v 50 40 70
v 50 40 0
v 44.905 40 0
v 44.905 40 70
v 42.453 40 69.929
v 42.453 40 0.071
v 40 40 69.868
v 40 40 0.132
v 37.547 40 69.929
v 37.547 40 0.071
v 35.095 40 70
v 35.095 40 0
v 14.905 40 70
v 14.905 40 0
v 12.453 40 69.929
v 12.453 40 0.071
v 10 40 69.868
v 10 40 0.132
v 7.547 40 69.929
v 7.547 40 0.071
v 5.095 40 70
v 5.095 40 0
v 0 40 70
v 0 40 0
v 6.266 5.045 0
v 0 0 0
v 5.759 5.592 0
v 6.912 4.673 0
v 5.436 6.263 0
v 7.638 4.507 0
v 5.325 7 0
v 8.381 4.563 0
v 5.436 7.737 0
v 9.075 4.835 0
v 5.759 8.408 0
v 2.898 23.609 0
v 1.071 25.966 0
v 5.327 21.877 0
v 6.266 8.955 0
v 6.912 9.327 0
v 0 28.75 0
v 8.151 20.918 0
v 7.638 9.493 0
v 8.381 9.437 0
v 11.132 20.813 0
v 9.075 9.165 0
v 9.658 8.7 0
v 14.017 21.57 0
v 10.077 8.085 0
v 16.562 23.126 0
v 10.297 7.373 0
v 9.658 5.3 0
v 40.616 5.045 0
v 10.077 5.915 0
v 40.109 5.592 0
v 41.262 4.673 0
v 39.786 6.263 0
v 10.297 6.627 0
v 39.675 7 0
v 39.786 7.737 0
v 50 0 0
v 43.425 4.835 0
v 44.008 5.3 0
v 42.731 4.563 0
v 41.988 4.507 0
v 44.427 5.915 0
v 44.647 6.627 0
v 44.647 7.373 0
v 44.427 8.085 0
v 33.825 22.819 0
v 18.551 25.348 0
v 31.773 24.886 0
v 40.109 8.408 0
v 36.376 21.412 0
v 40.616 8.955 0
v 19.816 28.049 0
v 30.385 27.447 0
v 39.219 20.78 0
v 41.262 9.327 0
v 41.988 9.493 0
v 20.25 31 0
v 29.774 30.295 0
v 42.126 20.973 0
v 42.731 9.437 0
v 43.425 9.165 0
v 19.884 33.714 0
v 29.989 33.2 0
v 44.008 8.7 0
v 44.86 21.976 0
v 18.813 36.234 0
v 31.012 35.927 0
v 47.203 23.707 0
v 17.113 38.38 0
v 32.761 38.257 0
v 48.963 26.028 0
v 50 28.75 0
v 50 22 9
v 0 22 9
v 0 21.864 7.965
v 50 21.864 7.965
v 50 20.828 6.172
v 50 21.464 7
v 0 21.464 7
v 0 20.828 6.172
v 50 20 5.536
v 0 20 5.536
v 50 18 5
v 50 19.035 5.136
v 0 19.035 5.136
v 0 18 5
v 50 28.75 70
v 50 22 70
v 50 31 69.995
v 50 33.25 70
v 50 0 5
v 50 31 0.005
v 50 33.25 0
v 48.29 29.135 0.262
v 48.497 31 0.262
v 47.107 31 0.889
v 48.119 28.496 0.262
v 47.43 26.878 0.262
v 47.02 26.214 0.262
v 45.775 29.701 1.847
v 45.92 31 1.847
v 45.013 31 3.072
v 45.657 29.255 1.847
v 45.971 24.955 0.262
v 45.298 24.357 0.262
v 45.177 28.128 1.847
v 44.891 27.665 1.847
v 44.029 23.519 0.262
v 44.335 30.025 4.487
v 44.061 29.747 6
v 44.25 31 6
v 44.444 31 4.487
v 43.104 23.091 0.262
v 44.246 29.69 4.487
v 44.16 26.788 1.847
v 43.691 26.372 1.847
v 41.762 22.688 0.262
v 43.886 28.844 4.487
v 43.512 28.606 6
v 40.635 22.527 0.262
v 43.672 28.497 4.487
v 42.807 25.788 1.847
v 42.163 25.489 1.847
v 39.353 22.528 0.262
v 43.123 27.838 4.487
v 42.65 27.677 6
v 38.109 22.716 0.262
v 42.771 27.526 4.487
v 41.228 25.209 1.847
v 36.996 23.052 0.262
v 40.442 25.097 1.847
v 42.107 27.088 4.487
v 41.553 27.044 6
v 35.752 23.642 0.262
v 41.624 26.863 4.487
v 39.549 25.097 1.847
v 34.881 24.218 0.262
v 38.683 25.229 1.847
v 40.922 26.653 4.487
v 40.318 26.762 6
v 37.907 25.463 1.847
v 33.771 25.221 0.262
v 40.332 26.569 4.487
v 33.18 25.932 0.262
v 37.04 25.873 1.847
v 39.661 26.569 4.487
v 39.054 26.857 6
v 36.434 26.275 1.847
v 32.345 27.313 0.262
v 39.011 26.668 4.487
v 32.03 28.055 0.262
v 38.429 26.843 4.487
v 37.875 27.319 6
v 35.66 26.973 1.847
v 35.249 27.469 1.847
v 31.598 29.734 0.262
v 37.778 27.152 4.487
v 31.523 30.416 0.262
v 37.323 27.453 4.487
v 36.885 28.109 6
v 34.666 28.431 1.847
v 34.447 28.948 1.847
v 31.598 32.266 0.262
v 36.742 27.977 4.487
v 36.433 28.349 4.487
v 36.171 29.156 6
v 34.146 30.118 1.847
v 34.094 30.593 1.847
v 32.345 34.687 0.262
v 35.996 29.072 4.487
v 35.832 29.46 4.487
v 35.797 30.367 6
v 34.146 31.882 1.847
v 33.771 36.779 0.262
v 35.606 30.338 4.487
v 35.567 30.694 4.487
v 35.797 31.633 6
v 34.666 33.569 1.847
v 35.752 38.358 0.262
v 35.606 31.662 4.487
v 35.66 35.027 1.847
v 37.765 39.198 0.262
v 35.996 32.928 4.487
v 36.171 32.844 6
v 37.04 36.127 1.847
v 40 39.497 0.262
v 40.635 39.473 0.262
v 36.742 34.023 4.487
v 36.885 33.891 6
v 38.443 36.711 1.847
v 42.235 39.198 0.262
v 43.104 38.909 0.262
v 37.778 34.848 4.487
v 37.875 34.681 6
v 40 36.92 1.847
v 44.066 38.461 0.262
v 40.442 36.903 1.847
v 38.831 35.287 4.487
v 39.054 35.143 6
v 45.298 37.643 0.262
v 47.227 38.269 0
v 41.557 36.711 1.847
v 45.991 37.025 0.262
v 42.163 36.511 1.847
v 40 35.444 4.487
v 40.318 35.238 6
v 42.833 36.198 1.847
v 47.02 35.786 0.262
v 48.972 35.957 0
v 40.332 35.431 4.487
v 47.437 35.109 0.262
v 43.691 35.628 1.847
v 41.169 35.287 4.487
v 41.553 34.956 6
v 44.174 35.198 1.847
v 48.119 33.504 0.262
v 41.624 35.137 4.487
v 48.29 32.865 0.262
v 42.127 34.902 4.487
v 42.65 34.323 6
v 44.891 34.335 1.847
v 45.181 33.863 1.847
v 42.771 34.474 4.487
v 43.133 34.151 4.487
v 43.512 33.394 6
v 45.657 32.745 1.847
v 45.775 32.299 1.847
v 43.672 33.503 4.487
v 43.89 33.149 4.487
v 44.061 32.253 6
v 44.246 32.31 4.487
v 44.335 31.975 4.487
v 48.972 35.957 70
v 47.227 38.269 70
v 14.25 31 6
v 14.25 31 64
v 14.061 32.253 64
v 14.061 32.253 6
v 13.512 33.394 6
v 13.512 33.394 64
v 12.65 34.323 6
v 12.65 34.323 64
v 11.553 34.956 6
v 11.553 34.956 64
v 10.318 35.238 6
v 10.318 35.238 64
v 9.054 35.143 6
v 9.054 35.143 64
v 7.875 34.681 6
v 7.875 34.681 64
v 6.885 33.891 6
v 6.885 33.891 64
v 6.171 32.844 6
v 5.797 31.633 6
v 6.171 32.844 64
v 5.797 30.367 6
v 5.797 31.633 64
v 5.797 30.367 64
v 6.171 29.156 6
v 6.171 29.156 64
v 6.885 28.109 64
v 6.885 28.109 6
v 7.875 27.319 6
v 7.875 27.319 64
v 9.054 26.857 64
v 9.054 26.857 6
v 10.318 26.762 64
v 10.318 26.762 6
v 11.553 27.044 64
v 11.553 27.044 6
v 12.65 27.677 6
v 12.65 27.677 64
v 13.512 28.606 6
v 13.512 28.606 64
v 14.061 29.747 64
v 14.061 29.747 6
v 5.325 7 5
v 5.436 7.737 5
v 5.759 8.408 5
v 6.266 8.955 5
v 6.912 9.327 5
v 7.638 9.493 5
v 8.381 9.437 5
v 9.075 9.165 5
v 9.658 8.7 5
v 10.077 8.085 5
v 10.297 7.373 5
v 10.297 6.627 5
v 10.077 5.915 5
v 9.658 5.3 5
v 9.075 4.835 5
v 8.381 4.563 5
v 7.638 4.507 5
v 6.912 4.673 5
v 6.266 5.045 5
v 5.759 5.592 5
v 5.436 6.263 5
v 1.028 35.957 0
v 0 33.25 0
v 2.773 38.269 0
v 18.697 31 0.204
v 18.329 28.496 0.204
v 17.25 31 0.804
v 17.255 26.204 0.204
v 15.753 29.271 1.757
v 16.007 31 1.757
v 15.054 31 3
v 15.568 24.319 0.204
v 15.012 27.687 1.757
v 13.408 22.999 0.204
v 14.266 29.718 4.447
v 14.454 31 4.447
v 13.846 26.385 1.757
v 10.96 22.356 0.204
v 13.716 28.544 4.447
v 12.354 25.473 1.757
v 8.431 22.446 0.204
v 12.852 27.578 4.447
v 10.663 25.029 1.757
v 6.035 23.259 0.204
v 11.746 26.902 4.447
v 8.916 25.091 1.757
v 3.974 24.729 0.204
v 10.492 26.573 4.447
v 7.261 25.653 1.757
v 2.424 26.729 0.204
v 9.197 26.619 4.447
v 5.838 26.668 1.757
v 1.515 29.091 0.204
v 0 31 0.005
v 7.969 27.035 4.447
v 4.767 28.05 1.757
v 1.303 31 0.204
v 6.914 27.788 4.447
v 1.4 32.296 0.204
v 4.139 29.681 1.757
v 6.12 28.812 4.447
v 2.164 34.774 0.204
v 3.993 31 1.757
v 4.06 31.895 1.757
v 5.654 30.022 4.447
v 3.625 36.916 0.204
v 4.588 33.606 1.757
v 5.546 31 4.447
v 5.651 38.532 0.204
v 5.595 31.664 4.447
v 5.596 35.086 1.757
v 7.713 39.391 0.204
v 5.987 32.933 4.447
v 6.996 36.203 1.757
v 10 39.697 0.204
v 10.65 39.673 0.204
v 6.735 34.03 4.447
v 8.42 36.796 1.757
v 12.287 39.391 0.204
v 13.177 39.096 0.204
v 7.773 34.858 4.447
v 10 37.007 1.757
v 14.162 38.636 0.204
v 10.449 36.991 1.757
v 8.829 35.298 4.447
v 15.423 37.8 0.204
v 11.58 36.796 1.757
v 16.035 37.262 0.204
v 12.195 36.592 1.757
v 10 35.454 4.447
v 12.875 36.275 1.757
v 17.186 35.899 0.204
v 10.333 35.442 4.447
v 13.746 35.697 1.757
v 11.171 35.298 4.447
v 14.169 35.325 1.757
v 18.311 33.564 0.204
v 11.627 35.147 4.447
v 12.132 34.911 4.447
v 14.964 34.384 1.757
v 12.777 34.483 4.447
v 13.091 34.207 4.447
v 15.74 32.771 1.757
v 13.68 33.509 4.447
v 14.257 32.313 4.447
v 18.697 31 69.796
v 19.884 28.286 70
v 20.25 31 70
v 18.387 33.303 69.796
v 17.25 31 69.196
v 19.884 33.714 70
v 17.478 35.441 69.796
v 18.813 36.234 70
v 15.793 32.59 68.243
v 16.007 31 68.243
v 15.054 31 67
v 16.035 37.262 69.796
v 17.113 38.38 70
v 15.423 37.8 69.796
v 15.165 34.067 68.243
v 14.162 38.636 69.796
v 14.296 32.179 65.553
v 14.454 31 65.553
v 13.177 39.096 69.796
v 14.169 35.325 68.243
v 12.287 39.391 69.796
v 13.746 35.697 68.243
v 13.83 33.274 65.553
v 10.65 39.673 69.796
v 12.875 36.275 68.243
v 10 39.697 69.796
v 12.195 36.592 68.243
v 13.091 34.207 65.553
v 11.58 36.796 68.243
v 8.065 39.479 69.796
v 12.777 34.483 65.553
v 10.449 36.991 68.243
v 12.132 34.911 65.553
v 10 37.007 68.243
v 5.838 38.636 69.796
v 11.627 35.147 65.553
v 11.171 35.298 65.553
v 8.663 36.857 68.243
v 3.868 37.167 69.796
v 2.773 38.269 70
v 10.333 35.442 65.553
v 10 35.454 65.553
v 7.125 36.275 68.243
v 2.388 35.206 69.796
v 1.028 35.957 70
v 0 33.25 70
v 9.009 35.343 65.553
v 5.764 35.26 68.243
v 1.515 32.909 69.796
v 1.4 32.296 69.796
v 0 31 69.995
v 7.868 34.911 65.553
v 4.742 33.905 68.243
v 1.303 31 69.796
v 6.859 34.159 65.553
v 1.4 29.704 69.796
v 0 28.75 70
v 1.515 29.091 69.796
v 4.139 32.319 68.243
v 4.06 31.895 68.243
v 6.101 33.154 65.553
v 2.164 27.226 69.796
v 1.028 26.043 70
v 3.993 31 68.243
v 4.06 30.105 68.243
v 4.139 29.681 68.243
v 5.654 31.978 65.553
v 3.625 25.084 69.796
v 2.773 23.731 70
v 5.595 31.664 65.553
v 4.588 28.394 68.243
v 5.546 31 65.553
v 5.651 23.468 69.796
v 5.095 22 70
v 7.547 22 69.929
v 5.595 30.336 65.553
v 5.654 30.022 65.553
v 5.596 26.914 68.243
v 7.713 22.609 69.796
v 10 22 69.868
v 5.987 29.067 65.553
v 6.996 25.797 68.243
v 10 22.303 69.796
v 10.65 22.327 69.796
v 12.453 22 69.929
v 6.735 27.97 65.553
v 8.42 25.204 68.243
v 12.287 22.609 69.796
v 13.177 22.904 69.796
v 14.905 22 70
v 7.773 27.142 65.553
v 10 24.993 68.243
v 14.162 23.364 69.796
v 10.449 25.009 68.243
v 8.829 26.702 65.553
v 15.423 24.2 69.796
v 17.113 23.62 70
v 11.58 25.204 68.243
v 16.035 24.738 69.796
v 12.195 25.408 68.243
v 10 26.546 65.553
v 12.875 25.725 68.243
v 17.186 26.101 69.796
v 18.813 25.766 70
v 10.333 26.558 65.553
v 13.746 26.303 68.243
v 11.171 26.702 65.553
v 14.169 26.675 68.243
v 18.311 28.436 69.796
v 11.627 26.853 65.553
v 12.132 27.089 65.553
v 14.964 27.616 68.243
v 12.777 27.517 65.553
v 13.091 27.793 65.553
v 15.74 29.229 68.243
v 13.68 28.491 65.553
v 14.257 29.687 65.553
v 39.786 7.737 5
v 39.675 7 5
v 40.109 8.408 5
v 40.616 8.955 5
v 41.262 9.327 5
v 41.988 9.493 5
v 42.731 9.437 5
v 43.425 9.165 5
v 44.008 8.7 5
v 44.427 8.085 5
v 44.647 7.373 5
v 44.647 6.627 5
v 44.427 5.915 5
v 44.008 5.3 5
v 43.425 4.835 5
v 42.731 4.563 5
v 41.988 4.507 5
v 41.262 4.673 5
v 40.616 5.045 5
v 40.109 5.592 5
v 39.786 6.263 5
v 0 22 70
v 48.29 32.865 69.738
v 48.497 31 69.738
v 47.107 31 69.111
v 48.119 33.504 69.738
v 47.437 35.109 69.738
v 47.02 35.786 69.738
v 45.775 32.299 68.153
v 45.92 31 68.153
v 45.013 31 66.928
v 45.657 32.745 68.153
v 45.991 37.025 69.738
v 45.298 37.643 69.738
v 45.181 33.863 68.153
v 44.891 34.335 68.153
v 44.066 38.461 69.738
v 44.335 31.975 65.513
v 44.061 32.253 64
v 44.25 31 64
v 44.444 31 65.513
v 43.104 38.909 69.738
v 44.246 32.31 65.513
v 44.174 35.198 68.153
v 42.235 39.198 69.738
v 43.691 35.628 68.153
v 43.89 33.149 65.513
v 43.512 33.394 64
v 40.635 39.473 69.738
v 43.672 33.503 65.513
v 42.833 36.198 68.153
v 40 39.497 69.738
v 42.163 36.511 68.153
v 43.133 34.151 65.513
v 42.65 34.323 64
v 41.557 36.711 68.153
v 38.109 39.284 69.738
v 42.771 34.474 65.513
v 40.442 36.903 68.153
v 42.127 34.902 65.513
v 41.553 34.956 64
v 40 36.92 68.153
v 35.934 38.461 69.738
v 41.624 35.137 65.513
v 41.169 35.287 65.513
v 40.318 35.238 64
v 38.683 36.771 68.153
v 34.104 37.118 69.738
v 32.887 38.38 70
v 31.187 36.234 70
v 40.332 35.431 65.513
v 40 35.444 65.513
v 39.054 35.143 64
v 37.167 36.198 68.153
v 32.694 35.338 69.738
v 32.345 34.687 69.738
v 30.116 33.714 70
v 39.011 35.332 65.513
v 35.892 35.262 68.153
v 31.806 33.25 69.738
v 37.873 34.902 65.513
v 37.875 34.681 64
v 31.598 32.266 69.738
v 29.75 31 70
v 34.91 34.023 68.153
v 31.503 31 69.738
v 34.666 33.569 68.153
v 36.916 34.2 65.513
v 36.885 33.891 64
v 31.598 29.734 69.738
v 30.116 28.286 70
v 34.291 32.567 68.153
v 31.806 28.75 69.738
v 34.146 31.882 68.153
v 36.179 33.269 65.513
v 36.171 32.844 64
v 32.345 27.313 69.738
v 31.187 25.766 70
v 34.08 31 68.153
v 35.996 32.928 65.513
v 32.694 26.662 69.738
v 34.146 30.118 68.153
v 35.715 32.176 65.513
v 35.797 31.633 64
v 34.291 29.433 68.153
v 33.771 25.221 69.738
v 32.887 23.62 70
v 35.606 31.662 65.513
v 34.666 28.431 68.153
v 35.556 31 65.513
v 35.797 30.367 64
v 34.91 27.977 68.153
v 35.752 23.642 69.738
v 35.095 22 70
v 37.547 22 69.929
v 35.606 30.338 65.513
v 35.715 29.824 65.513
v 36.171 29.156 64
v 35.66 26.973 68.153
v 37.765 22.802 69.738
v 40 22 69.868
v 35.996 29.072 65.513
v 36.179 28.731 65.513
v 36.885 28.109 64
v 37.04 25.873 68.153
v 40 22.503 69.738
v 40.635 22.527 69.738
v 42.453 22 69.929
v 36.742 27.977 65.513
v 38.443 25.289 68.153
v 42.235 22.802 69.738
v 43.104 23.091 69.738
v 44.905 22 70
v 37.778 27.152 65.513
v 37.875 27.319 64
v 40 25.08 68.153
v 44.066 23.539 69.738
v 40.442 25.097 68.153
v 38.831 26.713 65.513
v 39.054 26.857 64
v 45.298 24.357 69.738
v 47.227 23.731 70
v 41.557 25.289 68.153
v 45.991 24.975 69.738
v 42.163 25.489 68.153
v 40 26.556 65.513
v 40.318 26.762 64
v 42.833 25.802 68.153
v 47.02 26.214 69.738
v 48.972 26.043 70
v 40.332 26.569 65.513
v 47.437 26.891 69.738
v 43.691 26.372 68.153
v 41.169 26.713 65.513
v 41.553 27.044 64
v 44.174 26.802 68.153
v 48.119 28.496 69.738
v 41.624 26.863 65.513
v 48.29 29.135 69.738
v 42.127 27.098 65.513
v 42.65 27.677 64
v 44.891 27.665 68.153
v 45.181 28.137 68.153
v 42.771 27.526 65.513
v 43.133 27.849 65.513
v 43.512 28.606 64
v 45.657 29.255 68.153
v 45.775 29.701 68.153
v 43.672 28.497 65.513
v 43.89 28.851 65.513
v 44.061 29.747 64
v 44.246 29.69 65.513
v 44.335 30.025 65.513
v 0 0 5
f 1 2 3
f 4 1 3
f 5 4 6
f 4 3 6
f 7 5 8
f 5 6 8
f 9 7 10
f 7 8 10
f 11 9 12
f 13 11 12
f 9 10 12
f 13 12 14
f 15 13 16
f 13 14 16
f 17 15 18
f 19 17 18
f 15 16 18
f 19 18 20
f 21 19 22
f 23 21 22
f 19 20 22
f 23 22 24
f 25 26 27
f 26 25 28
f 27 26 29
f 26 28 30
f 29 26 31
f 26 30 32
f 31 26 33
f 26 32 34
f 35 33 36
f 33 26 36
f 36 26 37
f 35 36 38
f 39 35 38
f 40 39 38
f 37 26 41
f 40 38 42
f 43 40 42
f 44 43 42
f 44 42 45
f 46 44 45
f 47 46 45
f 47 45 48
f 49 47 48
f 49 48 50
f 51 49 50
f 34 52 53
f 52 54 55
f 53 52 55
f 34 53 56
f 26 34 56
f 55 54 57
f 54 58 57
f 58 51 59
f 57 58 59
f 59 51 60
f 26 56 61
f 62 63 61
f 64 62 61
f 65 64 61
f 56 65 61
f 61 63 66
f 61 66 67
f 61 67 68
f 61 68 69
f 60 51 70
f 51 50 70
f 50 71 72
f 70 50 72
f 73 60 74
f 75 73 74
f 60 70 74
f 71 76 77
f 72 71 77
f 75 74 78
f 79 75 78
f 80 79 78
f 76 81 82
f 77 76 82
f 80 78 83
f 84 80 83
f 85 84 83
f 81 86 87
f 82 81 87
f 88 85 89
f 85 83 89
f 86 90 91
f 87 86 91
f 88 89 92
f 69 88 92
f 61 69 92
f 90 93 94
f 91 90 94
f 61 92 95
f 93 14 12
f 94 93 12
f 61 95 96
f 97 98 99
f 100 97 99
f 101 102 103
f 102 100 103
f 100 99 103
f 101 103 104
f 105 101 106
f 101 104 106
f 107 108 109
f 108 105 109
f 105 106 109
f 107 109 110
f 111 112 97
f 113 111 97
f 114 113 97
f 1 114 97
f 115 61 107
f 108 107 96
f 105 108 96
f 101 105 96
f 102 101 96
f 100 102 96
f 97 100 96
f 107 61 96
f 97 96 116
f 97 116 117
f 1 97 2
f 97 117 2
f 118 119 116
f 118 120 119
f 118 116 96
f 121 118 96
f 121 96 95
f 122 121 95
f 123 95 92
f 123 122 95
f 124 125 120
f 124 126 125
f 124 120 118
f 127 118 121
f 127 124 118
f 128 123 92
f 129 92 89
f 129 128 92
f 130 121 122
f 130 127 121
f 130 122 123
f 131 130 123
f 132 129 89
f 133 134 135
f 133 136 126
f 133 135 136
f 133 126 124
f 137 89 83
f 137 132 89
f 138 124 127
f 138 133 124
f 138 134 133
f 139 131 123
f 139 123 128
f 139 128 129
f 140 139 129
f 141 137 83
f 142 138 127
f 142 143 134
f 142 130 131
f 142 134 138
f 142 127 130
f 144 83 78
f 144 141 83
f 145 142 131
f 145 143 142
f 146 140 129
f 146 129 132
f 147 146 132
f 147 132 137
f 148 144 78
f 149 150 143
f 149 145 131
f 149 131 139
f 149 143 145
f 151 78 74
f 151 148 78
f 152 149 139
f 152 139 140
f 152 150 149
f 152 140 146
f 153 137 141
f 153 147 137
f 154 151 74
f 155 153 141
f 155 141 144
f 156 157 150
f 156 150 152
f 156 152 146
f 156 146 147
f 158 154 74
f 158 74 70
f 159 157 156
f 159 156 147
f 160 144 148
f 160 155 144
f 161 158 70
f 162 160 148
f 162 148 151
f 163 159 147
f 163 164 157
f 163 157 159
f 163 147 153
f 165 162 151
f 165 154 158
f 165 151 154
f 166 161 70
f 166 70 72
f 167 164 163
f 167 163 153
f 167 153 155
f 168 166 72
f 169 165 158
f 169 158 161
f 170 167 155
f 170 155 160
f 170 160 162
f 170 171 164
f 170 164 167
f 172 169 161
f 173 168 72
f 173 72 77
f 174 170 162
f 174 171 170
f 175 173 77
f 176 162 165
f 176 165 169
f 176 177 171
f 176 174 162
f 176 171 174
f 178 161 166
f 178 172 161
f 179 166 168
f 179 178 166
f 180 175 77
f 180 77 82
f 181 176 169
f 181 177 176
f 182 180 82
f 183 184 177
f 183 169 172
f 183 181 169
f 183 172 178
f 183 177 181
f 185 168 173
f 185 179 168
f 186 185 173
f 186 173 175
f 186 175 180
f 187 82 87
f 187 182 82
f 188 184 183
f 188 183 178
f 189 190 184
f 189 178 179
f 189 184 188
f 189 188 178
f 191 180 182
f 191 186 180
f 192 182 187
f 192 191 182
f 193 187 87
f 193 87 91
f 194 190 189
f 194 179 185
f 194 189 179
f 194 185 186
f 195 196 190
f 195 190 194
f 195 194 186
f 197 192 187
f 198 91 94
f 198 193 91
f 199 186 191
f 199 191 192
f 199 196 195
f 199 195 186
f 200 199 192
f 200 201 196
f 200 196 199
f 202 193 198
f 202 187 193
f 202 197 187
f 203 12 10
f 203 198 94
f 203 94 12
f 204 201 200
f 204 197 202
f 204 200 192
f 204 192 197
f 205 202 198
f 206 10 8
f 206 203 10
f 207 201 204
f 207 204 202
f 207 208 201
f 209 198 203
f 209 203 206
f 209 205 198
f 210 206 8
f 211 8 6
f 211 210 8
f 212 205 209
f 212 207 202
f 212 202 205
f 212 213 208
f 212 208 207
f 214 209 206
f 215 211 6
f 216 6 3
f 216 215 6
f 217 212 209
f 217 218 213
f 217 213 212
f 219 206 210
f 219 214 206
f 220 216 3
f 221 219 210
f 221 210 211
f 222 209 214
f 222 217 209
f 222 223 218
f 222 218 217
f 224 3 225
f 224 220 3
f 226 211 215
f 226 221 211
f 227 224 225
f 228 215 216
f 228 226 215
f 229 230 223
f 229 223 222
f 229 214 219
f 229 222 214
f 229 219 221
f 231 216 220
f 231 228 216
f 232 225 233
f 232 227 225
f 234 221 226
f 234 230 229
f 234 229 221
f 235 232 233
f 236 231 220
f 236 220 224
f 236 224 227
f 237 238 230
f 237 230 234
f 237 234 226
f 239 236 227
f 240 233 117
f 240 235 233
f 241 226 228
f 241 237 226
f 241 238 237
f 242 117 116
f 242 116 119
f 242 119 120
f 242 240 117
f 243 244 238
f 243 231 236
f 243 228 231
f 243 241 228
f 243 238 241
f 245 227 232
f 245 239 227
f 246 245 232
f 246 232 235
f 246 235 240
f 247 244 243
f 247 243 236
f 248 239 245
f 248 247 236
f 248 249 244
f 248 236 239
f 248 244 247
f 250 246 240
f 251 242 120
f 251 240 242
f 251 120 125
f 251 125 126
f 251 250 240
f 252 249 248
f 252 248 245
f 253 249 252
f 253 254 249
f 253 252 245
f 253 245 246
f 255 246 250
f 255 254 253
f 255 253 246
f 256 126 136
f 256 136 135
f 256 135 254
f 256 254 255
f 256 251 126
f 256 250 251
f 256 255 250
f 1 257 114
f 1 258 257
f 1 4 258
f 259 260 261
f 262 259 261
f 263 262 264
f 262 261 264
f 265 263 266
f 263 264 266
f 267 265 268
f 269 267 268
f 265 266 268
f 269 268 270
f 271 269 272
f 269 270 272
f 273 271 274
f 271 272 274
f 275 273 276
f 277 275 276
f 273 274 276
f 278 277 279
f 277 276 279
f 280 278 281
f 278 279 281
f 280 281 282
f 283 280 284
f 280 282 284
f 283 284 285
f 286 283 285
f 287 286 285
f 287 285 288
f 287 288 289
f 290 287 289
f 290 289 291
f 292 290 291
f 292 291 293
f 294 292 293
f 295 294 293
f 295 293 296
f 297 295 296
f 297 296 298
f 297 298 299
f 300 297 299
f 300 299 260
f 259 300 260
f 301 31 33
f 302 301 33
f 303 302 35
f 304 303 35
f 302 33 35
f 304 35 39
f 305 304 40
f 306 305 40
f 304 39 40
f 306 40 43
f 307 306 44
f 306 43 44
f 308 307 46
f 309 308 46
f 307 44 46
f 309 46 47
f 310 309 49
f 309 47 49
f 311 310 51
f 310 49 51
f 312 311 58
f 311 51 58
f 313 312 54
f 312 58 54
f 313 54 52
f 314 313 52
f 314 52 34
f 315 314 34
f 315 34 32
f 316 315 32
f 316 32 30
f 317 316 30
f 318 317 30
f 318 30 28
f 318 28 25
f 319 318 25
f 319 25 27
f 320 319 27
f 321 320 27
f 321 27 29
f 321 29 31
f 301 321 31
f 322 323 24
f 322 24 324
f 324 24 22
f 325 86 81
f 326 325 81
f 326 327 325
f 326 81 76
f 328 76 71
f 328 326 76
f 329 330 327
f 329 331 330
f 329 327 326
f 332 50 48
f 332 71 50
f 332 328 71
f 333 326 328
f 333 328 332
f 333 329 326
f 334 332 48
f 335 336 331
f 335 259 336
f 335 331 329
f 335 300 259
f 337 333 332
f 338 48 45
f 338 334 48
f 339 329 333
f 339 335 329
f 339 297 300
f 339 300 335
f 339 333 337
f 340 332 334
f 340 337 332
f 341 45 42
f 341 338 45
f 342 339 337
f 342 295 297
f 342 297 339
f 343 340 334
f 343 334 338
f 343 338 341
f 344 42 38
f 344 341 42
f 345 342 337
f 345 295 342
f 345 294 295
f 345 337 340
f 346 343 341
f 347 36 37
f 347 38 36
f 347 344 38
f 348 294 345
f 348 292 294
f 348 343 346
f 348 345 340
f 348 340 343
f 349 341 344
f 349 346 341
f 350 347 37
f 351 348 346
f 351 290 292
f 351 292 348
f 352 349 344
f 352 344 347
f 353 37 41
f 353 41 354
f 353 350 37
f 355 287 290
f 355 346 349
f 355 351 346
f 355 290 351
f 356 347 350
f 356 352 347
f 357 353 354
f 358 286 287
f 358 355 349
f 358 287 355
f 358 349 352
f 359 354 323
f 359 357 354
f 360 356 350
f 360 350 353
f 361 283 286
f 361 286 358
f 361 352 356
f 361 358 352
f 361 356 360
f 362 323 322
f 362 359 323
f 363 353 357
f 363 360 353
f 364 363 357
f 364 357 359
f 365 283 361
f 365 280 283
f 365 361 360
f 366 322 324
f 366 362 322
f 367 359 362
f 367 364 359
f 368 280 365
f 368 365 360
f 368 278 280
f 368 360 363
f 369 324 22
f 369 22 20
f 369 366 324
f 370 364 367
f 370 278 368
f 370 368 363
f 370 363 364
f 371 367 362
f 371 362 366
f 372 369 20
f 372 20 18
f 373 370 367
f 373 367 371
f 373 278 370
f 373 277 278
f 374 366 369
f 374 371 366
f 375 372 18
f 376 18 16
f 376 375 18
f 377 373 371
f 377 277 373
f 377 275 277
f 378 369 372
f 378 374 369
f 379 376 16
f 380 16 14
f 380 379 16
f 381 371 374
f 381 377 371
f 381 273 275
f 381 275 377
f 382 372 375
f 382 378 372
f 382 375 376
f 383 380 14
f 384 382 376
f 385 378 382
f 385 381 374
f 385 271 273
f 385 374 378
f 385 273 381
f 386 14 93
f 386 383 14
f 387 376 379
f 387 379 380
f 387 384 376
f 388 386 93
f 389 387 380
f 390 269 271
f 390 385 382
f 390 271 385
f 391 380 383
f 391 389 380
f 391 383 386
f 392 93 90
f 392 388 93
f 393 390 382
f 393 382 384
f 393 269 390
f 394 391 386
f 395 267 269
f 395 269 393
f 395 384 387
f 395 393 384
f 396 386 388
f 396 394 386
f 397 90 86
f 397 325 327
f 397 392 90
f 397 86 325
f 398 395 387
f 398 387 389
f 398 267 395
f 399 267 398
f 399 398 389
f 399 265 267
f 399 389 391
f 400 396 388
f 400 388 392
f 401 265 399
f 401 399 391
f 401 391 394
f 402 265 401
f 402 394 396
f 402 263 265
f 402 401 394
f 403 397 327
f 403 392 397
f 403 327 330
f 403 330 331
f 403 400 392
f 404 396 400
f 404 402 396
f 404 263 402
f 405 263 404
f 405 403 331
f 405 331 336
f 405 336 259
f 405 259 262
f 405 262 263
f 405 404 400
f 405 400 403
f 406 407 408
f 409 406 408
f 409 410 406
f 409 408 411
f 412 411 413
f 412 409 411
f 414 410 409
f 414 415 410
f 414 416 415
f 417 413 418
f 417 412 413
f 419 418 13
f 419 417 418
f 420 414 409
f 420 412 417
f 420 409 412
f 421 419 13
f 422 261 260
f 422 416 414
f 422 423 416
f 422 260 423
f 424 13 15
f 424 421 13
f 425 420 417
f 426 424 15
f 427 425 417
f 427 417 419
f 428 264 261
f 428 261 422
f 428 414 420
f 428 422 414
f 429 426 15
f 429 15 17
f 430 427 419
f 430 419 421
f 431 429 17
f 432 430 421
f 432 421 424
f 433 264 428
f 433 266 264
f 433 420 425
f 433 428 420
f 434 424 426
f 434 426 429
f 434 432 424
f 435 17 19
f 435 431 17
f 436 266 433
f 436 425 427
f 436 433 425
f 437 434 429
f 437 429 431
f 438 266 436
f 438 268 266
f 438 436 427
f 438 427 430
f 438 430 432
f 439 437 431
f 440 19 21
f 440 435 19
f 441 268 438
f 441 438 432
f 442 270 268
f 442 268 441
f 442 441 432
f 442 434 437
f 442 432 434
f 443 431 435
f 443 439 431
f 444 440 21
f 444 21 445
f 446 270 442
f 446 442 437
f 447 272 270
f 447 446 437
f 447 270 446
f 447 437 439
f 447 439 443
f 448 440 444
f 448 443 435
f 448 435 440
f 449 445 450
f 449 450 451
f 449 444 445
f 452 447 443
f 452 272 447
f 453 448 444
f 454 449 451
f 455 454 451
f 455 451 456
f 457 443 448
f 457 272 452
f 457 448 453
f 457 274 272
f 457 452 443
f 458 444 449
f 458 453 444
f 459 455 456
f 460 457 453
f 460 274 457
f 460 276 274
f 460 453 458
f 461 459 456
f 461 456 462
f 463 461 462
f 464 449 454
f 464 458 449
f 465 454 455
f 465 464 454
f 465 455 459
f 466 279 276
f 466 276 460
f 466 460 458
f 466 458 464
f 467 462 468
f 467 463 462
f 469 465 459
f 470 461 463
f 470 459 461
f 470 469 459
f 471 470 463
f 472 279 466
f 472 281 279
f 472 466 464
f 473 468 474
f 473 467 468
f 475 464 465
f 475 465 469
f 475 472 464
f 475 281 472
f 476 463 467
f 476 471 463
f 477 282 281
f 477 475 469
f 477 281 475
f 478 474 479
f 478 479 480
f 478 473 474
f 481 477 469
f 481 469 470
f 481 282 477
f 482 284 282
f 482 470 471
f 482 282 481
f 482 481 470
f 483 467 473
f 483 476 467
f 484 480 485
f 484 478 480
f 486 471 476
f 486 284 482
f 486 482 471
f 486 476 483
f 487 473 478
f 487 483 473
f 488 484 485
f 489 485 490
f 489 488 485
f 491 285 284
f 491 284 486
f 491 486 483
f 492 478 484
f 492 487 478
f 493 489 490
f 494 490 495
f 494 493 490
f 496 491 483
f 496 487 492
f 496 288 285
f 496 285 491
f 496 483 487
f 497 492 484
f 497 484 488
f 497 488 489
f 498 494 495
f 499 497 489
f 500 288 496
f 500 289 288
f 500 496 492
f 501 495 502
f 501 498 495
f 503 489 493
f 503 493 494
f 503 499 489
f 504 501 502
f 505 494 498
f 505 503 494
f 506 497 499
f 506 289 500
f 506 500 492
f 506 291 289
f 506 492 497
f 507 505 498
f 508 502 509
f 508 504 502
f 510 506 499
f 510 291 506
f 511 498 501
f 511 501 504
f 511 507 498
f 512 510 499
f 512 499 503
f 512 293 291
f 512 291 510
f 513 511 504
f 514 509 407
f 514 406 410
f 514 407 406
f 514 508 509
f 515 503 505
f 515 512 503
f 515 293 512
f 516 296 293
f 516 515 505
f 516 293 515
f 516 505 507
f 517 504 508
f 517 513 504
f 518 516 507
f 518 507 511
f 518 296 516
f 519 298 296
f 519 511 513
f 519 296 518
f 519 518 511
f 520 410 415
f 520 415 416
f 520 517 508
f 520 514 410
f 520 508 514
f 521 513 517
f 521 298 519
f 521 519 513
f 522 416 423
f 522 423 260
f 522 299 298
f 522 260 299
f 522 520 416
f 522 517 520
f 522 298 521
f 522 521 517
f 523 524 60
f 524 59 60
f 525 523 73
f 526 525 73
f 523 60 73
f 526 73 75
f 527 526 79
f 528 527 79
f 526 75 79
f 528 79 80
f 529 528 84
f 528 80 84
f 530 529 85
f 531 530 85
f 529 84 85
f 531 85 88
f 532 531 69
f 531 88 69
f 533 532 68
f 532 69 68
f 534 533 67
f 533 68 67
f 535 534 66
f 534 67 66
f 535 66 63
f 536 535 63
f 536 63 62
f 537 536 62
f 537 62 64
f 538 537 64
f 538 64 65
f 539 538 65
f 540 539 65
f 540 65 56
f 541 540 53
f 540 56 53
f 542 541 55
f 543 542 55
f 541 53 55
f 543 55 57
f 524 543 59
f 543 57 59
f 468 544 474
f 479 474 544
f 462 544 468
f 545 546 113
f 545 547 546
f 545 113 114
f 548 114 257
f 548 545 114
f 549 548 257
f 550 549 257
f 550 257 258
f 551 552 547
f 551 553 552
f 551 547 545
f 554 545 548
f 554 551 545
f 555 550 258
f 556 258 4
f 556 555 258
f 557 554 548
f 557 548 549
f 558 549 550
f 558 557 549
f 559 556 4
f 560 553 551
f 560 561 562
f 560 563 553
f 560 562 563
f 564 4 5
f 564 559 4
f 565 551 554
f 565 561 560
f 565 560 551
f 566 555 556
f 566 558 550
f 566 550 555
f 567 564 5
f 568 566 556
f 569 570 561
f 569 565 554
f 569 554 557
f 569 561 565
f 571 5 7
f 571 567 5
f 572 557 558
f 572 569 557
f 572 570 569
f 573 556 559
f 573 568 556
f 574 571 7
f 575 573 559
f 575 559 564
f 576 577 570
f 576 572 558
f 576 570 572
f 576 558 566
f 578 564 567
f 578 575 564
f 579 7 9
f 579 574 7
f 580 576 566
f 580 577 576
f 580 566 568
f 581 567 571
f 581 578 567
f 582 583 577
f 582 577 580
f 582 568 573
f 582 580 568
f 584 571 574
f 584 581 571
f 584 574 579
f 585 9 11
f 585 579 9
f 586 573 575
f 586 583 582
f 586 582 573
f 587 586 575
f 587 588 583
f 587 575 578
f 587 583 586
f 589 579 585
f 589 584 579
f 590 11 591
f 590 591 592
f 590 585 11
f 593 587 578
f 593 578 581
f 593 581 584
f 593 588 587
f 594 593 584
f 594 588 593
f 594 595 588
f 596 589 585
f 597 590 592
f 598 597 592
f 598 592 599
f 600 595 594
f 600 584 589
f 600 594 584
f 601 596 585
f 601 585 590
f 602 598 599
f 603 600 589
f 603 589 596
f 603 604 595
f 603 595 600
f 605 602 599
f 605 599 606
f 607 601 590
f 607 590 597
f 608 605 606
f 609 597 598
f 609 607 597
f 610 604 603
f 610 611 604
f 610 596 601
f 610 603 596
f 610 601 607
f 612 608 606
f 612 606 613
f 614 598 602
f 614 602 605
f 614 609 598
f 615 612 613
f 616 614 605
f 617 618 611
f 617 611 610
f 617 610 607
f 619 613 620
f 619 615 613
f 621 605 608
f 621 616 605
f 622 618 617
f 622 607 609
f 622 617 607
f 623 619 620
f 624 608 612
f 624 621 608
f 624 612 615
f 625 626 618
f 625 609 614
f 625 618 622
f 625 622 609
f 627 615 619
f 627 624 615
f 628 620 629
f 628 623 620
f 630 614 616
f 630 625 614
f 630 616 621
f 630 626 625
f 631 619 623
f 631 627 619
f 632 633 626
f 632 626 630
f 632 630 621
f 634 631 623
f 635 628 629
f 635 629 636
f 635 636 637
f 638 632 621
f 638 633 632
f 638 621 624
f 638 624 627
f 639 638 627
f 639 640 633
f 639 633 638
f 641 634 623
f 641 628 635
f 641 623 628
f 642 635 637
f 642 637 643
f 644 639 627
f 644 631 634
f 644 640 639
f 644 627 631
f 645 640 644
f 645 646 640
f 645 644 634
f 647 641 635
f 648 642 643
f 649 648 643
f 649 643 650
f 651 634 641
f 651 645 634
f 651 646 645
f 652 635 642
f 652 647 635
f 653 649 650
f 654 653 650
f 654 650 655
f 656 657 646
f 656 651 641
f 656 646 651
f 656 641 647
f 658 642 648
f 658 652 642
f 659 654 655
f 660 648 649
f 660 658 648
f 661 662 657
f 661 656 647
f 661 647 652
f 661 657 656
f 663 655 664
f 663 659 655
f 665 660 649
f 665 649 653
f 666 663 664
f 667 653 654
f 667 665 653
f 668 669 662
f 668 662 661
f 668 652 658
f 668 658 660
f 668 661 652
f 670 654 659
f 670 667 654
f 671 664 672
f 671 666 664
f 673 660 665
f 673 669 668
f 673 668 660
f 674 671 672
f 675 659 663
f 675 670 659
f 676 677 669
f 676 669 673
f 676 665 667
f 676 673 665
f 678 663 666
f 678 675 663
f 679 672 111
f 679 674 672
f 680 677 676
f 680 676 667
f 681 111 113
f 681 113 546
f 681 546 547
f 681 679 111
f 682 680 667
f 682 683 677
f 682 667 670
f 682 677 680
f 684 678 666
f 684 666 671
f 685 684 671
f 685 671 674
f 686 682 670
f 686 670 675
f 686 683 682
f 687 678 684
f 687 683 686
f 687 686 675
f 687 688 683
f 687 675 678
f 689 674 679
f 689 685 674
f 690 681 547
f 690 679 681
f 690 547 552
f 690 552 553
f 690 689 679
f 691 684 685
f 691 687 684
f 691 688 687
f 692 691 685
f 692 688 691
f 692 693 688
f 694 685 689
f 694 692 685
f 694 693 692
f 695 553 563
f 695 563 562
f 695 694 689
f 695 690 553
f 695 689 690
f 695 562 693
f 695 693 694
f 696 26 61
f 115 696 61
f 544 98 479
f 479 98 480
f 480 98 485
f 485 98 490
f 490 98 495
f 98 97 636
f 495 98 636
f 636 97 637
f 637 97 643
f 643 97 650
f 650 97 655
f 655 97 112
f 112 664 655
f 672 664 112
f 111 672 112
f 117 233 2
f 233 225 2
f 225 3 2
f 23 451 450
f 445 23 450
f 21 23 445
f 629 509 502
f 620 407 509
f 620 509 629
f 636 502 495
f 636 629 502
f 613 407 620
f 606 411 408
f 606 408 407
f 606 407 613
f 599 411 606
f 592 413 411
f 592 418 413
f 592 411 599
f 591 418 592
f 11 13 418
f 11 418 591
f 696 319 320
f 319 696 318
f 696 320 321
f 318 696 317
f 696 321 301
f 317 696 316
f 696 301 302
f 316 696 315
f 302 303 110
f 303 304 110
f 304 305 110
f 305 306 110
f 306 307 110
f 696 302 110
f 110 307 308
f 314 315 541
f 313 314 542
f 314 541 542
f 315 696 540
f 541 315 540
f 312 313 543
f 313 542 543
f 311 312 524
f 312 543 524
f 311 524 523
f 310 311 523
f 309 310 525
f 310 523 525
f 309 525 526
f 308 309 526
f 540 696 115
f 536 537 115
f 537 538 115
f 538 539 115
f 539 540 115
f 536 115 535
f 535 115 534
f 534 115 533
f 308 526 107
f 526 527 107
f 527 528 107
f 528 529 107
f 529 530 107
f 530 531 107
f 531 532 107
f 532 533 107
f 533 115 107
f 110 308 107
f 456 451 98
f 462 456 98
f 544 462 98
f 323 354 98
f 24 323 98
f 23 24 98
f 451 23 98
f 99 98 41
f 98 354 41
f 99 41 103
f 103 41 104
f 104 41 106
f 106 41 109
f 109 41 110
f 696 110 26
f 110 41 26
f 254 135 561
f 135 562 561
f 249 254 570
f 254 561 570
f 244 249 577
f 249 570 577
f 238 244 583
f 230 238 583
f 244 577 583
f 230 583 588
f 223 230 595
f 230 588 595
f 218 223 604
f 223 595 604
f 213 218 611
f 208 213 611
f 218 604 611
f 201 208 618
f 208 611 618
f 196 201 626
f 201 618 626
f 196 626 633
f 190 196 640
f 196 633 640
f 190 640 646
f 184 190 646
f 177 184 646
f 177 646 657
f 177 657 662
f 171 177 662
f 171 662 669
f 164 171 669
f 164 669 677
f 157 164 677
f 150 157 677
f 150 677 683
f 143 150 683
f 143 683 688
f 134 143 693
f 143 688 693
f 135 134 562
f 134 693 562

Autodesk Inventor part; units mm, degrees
ref_plane "YZ Plane" through (0, 0, 0) normal (1, 0, 0) x (0, 1, 0)
ref_plane "XZ Plane" through (0, 0, 0) normal (0, 1, 0) x (-1, 0, 0)
ref_plane "XY Plane" through (0, 0, 0) normal (0, 0, 1) x (1, 0, 0)
sketch "Sketch1" plane through (0, 0, 0) normal (0, 0, 1) x (1, 0, 0)
  line L0 (0, 0) -> (50, 0)
  line L1 (50, 0) -> (50, 40)
  line L2 (50, 40) -> (0, 40)
  line L3 (0, 40) -> (0, 0)
  dimension "d0" = 50
  dimension "d1" = 40
extrude "Extrusion1" add sketch "Sketch1" along normal blind 70
sketch "Sketch2" plane through (50, 0, 0) normal (1, 0, 0) x (0, 0, -1)
  line L0 (0, 0) -> (0, 40) projected
  line L1 (0, 40) -> (-70, 40) projected
  line L2 (-70, 0) -> (-70, 40) projected
  line L3 (0, 0) -> (-70, 0) projected
  line L4 (-70, 0) -> (-5, 0)
  line L5 (-5, 0) -> (-5, 22)
  line L6 (-5, 22) -> (-70, 22)
  line L7 (-70, 22) -> (-70, 0)
  point P0 (0, 0)
  dimension "d5" = 5
  dimension "d6" = 18
extrude "Extrusion2" cut sketch "Sketch2" against normal up to next contours L3 L2 L6 L5
sketch "Sketch3" plane through (0, 0, 70) normal (0, 0, 1) x (1, 0, 0)
  line L0 (0, 22) -> (50, 22) projected
  line L1 (50, 22) -> (50, 40) projected
  line L2 (50, 40) -> (0, 40) projected
  line L3 (0, 40) -> (0, 22) projected
  circle A0 centre (10, 31) radius 4.25
  circle A1 centre (40, 31) radius 4.25
  point P0 (0, 0)
  dimension "d9" = 8.5
  dimension "d10" = 8.5
  dimension "d11" = 30
  dimension "d12" = 50
  dimension "d13" = 10
  dimension "d14" = 18
  dimension "d15" = 9
  dimension "d16" = 9
extrude "Extrusion3" cut sketch "Sketch3" against normal up to next contours A0 | A1
fillet "Fillet1" radius 4 1 edges at (25, 22, 5)
sketch "Sketch4" plane through (0, 0, 0) normal (0, 0, -1) x (-1, 0, 0)
  circle A0 centre (-10, 31) radius 4.25 projected
  circle A1 centre (-40, 31) radius 4.25 projected
  line L0 (0, 0) -> (-50, 0) projected
  line L1 (0, 40) -> (0, 0) projected
  line L2 (-50, 40) -> (0, 40) projected
  line L3 (-50, 0) -> (-50, 40) projected
  circle A2 centre (-42.175, 7) radius 2.5
  circle A3 centre (-7.825, 7) radius 2.5
  dimension "d20" = 50
  dimension "d21" = 5
  dimension "d22" = 5
  dimension "d23" = 34.35
  dimension "d24" = 7.825
  dimension "d25" = 7
  dimension "d26" = 7
extrude "Extrusion4" cut sketch "Sketch4" against normal up to next contours A2 | A3
fillet "Fillet2" radius 6 4 edges at (35.75, 31, 0) (5.75, 31, 0) (35.75, 31, 70) (5.75, 31, 70)
equation "\"d9\" = d10"
equation "\"d13\" = -0.5 * d11 + 0.5 * d12"
equation "\"d15\" = 0.5 * d14"
equation "\"d16\" = d15"
equation "\"d24\" = -0.5 * d23 + 0.5 * d20"
equation "\"d26\" = d25"
properties part number "tubing_alignment_arm[3]"
